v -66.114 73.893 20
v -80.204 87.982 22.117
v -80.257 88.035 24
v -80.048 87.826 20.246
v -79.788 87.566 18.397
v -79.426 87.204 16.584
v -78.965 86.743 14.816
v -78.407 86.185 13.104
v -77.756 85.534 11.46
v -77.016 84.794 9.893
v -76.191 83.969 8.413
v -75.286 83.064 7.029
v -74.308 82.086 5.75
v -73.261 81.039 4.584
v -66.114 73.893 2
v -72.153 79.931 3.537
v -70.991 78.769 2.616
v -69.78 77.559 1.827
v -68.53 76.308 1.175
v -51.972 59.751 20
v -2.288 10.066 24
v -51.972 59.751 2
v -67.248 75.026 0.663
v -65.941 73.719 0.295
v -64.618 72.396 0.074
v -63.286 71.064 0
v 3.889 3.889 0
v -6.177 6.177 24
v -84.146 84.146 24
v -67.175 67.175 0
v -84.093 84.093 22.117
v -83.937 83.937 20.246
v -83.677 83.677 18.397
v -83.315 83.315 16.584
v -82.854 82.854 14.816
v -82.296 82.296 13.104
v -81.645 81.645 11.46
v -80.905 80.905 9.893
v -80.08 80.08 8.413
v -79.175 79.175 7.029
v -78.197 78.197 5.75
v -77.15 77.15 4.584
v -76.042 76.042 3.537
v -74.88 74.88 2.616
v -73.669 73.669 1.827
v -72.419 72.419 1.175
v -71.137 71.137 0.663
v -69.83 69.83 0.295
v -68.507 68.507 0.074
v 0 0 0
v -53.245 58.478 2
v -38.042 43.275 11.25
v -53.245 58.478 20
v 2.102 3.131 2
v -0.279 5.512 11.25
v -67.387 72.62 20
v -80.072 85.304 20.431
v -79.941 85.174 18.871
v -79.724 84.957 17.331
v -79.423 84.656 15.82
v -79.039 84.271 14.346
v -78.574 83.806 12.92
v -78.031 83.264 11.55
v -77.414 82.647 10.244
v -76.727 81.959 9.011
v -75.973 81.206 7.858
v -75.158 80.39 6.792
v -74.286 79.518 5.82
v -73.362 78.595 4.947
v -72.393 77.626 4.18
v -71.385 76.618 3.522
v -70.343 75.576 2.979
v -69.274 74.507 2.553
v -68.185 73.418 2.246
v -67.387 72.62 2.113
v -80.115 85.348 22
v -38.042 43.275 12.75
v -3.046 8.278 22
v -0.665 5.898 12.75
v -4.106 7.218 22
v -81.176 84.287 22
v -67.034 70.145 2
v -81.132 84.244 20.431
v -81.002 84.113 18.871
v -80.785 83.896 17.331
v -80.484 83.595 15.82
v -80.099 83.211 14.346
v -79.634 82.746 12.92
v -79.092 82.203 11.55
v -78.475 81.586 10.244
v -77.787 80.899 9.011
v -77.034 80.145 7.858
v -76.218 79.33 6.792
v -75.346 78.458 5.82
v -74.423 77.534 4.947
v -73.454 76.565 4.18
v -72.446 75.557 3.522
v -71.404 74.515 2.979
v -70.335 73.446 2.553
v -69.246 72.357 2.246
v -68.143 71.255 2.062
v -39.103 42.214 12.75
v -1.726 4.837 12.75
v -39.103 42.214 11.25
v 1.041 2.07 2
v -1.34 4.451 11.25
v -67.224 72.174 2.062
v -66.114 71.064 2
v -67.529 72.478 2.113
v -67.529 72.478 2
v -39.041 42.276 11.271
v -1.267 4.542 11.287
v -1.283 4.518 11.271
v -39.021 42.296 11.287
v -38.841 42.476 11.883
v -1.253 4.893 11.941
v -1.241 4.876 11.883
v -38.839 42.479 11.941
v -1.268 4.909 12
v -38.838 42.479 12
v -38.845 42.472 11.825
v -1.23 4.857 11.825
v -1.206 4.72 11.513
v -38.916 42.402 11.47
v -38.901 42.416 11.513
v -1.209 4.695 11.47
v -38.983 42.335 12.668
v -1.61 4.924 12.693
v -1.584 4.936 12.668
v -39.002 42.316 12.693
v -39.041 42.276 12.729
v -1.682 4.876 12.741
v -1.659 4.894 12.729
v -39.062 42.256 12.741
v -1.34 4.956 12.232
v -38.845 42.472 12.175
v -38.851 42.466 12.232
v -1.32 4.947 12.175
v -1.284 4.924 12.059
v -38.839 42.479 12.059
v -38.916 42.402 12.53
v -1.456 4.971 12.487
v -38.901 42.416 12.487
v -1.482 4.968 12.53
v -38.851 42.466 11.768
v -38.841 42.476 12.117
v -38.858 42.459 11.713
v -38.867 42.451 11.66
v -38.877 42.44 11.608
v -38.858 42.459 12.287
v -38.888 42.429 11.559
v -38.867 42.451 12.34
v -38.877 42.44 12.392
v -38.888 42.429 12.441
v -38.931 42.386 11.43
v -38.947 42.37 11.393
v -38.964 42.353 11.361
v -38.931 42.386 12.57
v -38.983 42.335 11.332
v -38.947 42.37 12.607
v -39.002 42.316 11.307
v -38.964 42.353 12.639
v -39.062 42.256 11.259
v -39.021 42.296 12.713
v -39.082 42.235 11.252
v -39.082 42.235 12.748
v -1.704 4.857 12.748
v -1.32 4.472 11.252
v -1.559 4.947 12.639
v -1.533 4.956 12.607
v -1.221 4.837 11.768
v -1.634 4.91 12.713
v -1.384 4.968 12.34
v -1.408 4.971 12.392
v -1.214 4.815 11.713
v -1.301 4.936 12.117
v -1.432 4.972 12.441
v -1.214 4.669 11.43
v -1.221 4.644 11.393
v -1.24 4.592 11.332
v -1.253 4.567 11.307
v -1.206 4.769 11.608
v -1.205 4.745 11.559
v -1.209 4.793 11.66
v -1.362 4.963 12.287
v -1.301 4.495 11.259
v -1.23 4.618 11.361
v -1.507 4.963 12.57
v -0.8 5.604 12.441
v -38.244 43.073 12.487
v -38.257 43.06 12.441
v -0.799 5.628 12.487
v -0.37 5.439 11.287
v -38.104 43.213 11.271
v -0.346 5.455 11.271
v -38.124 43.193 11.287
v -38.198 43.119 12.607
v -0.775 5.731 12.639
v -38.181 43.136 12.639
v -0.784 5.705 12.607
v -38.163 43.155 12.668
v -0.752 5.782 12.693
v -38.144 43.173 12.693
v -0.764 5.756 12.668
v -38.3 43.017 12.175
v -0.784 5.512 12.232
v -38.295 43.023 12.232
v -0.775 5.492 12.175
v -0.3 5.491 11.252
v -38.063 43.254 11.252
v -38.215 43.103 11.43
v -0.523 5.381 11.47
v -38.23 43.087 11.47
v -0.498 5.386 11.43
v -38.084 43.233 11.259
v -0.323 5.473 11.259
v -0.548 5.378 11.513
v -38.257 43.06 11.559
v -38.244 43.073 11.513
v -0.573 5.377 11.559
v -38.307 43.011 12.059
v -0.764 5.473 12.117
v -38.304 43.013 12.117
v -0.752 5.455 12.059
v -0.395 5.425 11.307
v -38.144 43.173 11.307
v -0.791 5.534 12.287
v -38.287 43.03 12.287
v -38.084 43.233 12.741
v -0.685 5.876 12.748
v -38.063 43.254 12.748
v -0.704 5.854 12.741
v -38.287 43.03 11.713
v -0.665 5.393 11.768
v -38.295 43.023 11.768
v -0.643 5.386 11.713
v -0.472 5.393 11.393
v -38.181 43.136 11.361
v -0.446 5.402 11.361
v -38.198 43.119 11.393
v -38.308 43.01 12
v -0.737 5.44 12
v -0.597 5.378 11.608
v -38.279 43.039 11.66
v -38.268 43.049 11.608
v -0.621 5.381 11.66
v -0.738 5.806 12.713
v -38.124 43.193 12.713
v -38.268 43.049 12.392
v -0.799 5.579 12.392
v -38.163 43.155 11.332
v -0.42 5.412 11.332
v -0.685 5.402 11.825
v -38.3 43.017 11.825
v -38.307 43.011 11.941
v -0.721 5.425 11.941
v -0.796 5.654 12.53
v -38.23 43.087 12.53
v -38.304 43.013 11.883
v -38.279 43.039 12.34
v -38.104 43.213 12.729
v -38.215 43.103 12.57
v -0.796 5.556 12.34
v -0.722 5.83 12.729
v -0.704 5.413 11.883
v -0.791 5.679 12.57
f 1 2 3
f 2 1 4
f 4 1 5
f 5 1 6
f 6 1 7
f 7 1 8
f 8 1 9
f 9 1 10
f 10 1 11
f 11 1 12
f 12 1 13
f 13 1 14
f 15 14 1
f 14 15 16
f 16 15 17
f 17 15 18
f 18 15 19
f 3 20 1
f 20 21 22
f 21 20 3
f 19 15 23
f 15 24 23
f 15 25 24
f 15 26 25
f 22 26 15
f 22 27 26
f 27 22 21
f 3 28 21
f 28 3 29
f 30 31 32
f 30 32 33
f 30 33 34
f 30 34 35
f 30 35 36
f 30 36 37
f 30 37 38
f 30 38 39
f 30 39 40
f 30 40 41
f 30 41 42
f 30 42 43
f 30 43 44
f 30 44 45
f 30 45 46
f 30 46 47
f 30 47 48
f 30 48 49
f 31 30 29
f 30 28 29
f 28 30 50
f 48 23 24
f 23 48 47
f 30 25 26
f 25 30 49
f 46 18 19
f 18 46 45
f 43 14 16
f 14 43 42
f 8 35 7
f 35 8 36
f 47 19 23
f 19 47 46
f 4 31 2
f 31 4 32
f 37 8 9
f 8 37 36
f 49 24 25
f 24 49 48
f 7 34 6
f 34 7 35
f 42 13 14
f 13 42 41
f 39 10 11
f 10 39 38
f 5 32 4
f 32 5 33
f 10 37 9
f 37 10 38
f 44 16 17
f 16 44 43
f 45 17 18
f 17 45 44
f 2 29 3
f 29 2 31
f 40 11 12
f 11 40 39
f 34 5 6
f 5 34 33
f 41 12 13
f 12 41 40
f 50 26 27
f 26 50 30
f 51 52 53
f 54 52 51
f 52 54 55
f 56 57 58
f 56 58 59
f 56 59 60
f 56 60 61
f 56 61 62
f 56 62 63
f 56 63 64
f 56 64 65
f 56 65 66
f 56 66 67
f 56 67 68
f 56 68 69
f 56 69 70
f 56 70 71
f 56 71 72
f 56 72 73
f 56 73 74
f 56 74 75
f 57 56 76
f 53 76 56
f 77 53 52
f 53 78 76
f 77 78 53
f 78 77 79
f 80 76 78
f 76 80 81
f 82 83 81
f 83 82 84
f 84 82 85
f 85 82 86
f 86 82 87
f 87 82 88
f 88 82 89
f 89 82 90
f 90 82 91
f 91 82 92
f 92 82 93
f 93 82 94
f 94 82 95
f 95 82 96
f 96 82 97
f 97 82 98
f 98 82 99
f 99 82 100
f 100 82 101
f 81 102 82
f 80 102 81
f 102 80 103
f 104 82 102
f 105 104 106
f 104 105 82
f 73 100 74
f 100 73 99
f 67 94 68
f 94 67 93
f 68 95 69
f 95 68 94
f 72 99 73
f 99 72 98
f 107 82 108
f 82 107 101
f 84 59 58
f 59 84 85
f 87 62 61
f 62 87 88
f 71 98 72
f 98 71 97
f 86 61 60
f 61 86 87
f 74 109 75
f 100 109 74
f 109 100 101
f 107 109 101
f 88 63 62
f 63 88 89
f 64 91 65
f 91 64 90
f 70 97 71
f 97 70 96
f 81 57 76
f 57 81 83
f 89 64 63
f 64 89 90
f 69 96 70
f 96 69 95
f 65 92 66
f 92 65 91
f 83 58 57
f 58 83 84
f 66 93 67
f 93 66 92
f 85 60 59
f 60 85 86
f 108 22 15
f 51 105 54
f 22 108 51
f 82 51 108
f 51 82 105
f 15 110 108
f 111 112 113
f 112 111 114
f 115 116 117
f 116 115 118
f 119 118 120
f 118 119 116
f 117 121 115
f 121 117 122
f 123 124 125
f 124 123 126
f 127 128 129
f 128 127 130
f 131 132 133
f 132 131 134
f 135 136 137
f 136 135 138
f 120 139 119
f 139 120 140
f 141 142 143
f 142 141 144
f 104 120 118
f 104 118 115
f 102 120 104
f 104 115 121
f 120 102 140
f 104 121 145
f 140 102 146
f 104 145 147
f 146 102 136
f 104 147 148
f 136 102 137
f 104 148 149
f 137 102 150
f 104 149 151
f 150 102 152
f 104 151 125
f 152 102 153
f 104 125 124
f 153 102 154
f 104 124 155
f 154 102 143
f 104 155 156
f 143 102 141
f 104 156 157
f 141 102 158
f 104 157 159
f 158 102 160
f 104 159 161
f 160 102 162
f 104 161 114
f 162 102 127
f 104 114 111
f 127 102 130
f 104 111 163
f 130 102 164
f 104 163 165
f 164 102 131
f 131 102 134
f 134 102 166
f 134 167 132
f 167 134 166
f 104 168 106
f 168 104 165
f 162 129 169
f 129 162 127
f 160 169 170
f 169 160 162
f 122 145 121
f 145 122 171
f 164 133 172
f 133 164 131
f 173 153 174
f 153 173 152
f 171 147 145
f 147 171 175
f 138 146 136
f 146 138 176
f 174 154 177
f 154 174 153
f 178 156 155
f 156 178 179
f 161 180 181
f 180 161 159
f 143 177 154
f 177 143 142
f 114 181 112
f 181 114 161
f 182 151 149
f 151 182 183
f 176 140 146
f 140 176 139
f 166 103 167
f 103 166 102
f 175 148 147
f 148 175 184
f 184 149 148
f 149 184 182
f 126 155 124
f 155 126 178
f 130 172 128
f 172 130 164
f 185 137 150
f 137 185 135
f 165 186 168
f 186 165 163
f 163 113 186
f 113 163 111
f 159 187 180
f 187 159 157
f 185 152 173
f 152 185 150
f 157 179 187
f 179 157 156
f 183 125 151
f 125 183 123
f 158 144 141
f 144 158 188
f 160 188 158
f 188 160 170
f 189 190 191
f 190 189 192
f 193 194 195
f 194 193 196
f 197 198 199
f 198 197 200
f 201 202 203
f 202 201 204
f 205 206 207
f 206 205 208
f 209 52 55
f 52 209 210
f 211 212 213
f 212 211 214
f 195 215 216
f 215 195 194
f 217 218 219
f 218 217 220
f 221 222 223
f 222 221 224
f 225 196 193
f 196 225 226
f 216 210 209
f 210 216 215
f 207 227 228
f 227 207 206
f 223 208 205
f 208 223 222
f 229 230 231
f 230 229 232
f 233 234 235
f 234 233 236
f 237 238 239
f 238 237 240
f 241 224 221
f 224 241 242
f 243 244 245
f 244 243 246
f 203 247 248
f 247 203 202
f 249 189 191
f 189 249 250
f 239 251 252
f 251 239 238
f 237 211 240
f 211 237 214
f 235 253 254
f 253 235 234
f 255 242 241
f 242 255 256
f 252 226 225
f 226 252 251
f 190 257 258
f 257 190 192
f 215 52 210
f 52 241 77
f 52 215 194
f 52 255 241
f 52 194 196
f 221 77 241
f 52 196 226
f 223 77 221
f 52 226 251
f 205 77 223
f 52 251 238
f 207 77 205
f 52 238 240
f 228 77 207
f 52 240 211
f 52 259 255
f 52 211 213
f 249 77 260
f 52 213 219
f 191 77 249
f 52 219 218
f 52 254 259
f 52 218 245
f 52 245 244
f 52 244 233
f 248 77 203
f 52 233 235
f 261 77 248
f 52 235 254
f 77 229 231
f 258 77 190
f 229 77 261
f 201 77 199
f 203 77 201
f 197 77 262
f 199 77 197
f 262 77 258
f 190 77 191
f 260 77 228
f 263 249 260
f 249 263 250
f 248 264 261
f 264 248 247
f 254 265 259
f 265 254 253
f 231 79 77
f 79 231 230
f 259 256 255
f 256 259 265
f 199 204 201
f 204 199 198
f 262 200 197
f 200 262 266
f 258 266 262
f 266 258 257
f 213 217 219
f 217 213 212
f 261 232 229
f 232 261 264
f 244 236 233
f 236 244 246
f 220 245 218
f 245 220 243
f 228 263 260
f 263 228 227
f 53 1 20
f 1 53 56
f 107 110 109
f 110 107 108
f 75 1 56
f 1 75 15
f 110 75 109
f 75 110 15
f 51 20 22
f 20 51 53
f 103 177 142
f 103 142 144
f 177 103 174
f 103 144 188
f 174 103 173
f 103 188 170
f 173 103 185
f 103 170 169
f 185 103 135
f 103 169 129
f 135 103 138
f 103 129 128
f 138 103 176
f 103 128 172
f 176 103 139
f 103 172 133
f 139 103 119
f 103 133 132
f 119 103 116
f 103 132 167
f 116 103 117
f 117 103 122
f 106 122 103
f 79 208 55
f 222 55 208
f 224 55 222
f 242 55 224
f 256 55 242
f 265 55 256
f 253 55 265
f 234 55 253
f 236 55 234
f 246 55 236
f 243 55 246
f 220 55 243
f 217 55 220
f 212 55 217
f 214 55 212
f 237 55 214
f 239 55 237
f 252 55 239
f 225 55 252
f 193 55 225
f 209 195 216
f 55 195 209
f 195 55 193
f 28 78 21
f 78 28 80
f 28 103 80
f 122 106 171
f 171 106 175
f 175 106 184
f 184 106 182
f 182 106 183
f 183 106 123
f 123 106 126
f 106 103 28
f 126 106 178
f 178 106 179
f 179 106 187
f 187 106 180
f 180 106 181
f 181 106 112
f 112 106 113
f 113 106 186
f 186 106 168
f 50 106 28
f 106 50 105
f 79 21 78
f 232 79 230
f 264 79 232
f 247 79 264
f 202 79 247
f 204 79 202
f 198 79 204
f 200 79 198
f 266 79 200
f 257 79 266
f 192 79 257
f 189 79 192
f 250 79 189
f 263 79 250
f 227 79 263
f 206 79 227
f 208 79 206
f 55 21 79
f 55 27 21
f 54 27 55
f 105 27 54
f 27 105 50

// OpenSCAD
// parametric knife sheath
// original by Steve Pendergrast (vorpal)
// https://www.thingiverse.com/thing:125109
//
// remix by BikeCyclist: Introducing holding ridge and oblique cut-off at grip
// https://www.thingiverse.com/thing:2856699

// length: the length of the blade from handle to tip
// maxwidth: the maximum width of the blade
// tipwidth:  the width near the tip, zero means it comes to a point
// thickness: maximum thickness of the blade
// show:  0 = do not put a window to show the blade style
// has_ridges: 0 = do not add ridges to the sheath to hold the knife by friction
// grip_cutoff_angle:  the angle of the mouth of the sheet at the grip (off the vertical)
//
// all measurements are in mm

//CUSTOMIZER VARIABLES

//	Knife length, mm
knife_length = 115;	//	[25:350]

//	Knife Max Blade width, mm
knife_width = 18;	//	[10:100]

//	Knife thickness, mm
knife_thickness = 1.5;	//	[1:5]

// Show knife through window?
knife_show = 1; // [0:No, 1:Yes]

// Sheath has ridges to hold the knife more securely?
has_ridges = 1; // [0:No, 1:Yes]

// Angle of the sheath at the grip (0 = vertical) [0:75]
grip_cutoff_angle = 20;

//CUSTOMIZER VARIABLES END

$fn = 80*1;  // while debugging reduce this to 20 to save time

wall = 2*1;
pad = 2*1;

rotate([0,0,45])
	parasheath(length=knife_length, maxwidth=knife_width, thickness=knife_thickness, show=knife_show);


module parasheath(length=200, maxwidth=25, thickness=2, show=1) {

    difference() {

        union () {

            difference() {

                // first make an oversized blade, oversized by 2 times the wall thickness

                blade(len=length+wall+pad,maxwid=maxwidth+pad+2*wall,thick=thickness+2*wall);

                translate([wall+0.2,-0.1,wall]) 
                    blade(len=length+0.1+pad, maxwid=maxwidth+pad, thick=thickness);

            }
            
            if (has_ridges)
            for (i = [-1, 1])
                translate([wall + 0.2 + knife_thickness/2, 0, wall + knife_width/2 + pad/2]) 
                    translate ([i * knife_thickness/2, 0, 0])
                        rotate ([-90, 0, 0])
                            scale ([1, 2, 1])
                                cylinder (d = knife_thickness / 2, h = length/2);
            
        }
        
        if (show)
            translate([thickness+wall,length-2*maxwidth,wall]) 
                    cube([100,wall+maxwidth,maxwidth]);

        rotate ([-grip_cutoff_angle, 0, 0])
            translate([0, -100, 0]) 
                    cube([200,200,200], center=true);
    }
}

module blade(len=200, maxwid=25, tipwid=5, thick=2) {

	union() {
		intersection() {
				// first make a cube
				cube([thick, len, maxwid]);
	
				translate([0,len-maxwid,maxwid]) 
					rotate([0,90,0]) 
						cylinder(r=maxwid,h=thick*3,center=true);
		}

		cube([thick,len-maxwid,maxwid]);
	}
}
